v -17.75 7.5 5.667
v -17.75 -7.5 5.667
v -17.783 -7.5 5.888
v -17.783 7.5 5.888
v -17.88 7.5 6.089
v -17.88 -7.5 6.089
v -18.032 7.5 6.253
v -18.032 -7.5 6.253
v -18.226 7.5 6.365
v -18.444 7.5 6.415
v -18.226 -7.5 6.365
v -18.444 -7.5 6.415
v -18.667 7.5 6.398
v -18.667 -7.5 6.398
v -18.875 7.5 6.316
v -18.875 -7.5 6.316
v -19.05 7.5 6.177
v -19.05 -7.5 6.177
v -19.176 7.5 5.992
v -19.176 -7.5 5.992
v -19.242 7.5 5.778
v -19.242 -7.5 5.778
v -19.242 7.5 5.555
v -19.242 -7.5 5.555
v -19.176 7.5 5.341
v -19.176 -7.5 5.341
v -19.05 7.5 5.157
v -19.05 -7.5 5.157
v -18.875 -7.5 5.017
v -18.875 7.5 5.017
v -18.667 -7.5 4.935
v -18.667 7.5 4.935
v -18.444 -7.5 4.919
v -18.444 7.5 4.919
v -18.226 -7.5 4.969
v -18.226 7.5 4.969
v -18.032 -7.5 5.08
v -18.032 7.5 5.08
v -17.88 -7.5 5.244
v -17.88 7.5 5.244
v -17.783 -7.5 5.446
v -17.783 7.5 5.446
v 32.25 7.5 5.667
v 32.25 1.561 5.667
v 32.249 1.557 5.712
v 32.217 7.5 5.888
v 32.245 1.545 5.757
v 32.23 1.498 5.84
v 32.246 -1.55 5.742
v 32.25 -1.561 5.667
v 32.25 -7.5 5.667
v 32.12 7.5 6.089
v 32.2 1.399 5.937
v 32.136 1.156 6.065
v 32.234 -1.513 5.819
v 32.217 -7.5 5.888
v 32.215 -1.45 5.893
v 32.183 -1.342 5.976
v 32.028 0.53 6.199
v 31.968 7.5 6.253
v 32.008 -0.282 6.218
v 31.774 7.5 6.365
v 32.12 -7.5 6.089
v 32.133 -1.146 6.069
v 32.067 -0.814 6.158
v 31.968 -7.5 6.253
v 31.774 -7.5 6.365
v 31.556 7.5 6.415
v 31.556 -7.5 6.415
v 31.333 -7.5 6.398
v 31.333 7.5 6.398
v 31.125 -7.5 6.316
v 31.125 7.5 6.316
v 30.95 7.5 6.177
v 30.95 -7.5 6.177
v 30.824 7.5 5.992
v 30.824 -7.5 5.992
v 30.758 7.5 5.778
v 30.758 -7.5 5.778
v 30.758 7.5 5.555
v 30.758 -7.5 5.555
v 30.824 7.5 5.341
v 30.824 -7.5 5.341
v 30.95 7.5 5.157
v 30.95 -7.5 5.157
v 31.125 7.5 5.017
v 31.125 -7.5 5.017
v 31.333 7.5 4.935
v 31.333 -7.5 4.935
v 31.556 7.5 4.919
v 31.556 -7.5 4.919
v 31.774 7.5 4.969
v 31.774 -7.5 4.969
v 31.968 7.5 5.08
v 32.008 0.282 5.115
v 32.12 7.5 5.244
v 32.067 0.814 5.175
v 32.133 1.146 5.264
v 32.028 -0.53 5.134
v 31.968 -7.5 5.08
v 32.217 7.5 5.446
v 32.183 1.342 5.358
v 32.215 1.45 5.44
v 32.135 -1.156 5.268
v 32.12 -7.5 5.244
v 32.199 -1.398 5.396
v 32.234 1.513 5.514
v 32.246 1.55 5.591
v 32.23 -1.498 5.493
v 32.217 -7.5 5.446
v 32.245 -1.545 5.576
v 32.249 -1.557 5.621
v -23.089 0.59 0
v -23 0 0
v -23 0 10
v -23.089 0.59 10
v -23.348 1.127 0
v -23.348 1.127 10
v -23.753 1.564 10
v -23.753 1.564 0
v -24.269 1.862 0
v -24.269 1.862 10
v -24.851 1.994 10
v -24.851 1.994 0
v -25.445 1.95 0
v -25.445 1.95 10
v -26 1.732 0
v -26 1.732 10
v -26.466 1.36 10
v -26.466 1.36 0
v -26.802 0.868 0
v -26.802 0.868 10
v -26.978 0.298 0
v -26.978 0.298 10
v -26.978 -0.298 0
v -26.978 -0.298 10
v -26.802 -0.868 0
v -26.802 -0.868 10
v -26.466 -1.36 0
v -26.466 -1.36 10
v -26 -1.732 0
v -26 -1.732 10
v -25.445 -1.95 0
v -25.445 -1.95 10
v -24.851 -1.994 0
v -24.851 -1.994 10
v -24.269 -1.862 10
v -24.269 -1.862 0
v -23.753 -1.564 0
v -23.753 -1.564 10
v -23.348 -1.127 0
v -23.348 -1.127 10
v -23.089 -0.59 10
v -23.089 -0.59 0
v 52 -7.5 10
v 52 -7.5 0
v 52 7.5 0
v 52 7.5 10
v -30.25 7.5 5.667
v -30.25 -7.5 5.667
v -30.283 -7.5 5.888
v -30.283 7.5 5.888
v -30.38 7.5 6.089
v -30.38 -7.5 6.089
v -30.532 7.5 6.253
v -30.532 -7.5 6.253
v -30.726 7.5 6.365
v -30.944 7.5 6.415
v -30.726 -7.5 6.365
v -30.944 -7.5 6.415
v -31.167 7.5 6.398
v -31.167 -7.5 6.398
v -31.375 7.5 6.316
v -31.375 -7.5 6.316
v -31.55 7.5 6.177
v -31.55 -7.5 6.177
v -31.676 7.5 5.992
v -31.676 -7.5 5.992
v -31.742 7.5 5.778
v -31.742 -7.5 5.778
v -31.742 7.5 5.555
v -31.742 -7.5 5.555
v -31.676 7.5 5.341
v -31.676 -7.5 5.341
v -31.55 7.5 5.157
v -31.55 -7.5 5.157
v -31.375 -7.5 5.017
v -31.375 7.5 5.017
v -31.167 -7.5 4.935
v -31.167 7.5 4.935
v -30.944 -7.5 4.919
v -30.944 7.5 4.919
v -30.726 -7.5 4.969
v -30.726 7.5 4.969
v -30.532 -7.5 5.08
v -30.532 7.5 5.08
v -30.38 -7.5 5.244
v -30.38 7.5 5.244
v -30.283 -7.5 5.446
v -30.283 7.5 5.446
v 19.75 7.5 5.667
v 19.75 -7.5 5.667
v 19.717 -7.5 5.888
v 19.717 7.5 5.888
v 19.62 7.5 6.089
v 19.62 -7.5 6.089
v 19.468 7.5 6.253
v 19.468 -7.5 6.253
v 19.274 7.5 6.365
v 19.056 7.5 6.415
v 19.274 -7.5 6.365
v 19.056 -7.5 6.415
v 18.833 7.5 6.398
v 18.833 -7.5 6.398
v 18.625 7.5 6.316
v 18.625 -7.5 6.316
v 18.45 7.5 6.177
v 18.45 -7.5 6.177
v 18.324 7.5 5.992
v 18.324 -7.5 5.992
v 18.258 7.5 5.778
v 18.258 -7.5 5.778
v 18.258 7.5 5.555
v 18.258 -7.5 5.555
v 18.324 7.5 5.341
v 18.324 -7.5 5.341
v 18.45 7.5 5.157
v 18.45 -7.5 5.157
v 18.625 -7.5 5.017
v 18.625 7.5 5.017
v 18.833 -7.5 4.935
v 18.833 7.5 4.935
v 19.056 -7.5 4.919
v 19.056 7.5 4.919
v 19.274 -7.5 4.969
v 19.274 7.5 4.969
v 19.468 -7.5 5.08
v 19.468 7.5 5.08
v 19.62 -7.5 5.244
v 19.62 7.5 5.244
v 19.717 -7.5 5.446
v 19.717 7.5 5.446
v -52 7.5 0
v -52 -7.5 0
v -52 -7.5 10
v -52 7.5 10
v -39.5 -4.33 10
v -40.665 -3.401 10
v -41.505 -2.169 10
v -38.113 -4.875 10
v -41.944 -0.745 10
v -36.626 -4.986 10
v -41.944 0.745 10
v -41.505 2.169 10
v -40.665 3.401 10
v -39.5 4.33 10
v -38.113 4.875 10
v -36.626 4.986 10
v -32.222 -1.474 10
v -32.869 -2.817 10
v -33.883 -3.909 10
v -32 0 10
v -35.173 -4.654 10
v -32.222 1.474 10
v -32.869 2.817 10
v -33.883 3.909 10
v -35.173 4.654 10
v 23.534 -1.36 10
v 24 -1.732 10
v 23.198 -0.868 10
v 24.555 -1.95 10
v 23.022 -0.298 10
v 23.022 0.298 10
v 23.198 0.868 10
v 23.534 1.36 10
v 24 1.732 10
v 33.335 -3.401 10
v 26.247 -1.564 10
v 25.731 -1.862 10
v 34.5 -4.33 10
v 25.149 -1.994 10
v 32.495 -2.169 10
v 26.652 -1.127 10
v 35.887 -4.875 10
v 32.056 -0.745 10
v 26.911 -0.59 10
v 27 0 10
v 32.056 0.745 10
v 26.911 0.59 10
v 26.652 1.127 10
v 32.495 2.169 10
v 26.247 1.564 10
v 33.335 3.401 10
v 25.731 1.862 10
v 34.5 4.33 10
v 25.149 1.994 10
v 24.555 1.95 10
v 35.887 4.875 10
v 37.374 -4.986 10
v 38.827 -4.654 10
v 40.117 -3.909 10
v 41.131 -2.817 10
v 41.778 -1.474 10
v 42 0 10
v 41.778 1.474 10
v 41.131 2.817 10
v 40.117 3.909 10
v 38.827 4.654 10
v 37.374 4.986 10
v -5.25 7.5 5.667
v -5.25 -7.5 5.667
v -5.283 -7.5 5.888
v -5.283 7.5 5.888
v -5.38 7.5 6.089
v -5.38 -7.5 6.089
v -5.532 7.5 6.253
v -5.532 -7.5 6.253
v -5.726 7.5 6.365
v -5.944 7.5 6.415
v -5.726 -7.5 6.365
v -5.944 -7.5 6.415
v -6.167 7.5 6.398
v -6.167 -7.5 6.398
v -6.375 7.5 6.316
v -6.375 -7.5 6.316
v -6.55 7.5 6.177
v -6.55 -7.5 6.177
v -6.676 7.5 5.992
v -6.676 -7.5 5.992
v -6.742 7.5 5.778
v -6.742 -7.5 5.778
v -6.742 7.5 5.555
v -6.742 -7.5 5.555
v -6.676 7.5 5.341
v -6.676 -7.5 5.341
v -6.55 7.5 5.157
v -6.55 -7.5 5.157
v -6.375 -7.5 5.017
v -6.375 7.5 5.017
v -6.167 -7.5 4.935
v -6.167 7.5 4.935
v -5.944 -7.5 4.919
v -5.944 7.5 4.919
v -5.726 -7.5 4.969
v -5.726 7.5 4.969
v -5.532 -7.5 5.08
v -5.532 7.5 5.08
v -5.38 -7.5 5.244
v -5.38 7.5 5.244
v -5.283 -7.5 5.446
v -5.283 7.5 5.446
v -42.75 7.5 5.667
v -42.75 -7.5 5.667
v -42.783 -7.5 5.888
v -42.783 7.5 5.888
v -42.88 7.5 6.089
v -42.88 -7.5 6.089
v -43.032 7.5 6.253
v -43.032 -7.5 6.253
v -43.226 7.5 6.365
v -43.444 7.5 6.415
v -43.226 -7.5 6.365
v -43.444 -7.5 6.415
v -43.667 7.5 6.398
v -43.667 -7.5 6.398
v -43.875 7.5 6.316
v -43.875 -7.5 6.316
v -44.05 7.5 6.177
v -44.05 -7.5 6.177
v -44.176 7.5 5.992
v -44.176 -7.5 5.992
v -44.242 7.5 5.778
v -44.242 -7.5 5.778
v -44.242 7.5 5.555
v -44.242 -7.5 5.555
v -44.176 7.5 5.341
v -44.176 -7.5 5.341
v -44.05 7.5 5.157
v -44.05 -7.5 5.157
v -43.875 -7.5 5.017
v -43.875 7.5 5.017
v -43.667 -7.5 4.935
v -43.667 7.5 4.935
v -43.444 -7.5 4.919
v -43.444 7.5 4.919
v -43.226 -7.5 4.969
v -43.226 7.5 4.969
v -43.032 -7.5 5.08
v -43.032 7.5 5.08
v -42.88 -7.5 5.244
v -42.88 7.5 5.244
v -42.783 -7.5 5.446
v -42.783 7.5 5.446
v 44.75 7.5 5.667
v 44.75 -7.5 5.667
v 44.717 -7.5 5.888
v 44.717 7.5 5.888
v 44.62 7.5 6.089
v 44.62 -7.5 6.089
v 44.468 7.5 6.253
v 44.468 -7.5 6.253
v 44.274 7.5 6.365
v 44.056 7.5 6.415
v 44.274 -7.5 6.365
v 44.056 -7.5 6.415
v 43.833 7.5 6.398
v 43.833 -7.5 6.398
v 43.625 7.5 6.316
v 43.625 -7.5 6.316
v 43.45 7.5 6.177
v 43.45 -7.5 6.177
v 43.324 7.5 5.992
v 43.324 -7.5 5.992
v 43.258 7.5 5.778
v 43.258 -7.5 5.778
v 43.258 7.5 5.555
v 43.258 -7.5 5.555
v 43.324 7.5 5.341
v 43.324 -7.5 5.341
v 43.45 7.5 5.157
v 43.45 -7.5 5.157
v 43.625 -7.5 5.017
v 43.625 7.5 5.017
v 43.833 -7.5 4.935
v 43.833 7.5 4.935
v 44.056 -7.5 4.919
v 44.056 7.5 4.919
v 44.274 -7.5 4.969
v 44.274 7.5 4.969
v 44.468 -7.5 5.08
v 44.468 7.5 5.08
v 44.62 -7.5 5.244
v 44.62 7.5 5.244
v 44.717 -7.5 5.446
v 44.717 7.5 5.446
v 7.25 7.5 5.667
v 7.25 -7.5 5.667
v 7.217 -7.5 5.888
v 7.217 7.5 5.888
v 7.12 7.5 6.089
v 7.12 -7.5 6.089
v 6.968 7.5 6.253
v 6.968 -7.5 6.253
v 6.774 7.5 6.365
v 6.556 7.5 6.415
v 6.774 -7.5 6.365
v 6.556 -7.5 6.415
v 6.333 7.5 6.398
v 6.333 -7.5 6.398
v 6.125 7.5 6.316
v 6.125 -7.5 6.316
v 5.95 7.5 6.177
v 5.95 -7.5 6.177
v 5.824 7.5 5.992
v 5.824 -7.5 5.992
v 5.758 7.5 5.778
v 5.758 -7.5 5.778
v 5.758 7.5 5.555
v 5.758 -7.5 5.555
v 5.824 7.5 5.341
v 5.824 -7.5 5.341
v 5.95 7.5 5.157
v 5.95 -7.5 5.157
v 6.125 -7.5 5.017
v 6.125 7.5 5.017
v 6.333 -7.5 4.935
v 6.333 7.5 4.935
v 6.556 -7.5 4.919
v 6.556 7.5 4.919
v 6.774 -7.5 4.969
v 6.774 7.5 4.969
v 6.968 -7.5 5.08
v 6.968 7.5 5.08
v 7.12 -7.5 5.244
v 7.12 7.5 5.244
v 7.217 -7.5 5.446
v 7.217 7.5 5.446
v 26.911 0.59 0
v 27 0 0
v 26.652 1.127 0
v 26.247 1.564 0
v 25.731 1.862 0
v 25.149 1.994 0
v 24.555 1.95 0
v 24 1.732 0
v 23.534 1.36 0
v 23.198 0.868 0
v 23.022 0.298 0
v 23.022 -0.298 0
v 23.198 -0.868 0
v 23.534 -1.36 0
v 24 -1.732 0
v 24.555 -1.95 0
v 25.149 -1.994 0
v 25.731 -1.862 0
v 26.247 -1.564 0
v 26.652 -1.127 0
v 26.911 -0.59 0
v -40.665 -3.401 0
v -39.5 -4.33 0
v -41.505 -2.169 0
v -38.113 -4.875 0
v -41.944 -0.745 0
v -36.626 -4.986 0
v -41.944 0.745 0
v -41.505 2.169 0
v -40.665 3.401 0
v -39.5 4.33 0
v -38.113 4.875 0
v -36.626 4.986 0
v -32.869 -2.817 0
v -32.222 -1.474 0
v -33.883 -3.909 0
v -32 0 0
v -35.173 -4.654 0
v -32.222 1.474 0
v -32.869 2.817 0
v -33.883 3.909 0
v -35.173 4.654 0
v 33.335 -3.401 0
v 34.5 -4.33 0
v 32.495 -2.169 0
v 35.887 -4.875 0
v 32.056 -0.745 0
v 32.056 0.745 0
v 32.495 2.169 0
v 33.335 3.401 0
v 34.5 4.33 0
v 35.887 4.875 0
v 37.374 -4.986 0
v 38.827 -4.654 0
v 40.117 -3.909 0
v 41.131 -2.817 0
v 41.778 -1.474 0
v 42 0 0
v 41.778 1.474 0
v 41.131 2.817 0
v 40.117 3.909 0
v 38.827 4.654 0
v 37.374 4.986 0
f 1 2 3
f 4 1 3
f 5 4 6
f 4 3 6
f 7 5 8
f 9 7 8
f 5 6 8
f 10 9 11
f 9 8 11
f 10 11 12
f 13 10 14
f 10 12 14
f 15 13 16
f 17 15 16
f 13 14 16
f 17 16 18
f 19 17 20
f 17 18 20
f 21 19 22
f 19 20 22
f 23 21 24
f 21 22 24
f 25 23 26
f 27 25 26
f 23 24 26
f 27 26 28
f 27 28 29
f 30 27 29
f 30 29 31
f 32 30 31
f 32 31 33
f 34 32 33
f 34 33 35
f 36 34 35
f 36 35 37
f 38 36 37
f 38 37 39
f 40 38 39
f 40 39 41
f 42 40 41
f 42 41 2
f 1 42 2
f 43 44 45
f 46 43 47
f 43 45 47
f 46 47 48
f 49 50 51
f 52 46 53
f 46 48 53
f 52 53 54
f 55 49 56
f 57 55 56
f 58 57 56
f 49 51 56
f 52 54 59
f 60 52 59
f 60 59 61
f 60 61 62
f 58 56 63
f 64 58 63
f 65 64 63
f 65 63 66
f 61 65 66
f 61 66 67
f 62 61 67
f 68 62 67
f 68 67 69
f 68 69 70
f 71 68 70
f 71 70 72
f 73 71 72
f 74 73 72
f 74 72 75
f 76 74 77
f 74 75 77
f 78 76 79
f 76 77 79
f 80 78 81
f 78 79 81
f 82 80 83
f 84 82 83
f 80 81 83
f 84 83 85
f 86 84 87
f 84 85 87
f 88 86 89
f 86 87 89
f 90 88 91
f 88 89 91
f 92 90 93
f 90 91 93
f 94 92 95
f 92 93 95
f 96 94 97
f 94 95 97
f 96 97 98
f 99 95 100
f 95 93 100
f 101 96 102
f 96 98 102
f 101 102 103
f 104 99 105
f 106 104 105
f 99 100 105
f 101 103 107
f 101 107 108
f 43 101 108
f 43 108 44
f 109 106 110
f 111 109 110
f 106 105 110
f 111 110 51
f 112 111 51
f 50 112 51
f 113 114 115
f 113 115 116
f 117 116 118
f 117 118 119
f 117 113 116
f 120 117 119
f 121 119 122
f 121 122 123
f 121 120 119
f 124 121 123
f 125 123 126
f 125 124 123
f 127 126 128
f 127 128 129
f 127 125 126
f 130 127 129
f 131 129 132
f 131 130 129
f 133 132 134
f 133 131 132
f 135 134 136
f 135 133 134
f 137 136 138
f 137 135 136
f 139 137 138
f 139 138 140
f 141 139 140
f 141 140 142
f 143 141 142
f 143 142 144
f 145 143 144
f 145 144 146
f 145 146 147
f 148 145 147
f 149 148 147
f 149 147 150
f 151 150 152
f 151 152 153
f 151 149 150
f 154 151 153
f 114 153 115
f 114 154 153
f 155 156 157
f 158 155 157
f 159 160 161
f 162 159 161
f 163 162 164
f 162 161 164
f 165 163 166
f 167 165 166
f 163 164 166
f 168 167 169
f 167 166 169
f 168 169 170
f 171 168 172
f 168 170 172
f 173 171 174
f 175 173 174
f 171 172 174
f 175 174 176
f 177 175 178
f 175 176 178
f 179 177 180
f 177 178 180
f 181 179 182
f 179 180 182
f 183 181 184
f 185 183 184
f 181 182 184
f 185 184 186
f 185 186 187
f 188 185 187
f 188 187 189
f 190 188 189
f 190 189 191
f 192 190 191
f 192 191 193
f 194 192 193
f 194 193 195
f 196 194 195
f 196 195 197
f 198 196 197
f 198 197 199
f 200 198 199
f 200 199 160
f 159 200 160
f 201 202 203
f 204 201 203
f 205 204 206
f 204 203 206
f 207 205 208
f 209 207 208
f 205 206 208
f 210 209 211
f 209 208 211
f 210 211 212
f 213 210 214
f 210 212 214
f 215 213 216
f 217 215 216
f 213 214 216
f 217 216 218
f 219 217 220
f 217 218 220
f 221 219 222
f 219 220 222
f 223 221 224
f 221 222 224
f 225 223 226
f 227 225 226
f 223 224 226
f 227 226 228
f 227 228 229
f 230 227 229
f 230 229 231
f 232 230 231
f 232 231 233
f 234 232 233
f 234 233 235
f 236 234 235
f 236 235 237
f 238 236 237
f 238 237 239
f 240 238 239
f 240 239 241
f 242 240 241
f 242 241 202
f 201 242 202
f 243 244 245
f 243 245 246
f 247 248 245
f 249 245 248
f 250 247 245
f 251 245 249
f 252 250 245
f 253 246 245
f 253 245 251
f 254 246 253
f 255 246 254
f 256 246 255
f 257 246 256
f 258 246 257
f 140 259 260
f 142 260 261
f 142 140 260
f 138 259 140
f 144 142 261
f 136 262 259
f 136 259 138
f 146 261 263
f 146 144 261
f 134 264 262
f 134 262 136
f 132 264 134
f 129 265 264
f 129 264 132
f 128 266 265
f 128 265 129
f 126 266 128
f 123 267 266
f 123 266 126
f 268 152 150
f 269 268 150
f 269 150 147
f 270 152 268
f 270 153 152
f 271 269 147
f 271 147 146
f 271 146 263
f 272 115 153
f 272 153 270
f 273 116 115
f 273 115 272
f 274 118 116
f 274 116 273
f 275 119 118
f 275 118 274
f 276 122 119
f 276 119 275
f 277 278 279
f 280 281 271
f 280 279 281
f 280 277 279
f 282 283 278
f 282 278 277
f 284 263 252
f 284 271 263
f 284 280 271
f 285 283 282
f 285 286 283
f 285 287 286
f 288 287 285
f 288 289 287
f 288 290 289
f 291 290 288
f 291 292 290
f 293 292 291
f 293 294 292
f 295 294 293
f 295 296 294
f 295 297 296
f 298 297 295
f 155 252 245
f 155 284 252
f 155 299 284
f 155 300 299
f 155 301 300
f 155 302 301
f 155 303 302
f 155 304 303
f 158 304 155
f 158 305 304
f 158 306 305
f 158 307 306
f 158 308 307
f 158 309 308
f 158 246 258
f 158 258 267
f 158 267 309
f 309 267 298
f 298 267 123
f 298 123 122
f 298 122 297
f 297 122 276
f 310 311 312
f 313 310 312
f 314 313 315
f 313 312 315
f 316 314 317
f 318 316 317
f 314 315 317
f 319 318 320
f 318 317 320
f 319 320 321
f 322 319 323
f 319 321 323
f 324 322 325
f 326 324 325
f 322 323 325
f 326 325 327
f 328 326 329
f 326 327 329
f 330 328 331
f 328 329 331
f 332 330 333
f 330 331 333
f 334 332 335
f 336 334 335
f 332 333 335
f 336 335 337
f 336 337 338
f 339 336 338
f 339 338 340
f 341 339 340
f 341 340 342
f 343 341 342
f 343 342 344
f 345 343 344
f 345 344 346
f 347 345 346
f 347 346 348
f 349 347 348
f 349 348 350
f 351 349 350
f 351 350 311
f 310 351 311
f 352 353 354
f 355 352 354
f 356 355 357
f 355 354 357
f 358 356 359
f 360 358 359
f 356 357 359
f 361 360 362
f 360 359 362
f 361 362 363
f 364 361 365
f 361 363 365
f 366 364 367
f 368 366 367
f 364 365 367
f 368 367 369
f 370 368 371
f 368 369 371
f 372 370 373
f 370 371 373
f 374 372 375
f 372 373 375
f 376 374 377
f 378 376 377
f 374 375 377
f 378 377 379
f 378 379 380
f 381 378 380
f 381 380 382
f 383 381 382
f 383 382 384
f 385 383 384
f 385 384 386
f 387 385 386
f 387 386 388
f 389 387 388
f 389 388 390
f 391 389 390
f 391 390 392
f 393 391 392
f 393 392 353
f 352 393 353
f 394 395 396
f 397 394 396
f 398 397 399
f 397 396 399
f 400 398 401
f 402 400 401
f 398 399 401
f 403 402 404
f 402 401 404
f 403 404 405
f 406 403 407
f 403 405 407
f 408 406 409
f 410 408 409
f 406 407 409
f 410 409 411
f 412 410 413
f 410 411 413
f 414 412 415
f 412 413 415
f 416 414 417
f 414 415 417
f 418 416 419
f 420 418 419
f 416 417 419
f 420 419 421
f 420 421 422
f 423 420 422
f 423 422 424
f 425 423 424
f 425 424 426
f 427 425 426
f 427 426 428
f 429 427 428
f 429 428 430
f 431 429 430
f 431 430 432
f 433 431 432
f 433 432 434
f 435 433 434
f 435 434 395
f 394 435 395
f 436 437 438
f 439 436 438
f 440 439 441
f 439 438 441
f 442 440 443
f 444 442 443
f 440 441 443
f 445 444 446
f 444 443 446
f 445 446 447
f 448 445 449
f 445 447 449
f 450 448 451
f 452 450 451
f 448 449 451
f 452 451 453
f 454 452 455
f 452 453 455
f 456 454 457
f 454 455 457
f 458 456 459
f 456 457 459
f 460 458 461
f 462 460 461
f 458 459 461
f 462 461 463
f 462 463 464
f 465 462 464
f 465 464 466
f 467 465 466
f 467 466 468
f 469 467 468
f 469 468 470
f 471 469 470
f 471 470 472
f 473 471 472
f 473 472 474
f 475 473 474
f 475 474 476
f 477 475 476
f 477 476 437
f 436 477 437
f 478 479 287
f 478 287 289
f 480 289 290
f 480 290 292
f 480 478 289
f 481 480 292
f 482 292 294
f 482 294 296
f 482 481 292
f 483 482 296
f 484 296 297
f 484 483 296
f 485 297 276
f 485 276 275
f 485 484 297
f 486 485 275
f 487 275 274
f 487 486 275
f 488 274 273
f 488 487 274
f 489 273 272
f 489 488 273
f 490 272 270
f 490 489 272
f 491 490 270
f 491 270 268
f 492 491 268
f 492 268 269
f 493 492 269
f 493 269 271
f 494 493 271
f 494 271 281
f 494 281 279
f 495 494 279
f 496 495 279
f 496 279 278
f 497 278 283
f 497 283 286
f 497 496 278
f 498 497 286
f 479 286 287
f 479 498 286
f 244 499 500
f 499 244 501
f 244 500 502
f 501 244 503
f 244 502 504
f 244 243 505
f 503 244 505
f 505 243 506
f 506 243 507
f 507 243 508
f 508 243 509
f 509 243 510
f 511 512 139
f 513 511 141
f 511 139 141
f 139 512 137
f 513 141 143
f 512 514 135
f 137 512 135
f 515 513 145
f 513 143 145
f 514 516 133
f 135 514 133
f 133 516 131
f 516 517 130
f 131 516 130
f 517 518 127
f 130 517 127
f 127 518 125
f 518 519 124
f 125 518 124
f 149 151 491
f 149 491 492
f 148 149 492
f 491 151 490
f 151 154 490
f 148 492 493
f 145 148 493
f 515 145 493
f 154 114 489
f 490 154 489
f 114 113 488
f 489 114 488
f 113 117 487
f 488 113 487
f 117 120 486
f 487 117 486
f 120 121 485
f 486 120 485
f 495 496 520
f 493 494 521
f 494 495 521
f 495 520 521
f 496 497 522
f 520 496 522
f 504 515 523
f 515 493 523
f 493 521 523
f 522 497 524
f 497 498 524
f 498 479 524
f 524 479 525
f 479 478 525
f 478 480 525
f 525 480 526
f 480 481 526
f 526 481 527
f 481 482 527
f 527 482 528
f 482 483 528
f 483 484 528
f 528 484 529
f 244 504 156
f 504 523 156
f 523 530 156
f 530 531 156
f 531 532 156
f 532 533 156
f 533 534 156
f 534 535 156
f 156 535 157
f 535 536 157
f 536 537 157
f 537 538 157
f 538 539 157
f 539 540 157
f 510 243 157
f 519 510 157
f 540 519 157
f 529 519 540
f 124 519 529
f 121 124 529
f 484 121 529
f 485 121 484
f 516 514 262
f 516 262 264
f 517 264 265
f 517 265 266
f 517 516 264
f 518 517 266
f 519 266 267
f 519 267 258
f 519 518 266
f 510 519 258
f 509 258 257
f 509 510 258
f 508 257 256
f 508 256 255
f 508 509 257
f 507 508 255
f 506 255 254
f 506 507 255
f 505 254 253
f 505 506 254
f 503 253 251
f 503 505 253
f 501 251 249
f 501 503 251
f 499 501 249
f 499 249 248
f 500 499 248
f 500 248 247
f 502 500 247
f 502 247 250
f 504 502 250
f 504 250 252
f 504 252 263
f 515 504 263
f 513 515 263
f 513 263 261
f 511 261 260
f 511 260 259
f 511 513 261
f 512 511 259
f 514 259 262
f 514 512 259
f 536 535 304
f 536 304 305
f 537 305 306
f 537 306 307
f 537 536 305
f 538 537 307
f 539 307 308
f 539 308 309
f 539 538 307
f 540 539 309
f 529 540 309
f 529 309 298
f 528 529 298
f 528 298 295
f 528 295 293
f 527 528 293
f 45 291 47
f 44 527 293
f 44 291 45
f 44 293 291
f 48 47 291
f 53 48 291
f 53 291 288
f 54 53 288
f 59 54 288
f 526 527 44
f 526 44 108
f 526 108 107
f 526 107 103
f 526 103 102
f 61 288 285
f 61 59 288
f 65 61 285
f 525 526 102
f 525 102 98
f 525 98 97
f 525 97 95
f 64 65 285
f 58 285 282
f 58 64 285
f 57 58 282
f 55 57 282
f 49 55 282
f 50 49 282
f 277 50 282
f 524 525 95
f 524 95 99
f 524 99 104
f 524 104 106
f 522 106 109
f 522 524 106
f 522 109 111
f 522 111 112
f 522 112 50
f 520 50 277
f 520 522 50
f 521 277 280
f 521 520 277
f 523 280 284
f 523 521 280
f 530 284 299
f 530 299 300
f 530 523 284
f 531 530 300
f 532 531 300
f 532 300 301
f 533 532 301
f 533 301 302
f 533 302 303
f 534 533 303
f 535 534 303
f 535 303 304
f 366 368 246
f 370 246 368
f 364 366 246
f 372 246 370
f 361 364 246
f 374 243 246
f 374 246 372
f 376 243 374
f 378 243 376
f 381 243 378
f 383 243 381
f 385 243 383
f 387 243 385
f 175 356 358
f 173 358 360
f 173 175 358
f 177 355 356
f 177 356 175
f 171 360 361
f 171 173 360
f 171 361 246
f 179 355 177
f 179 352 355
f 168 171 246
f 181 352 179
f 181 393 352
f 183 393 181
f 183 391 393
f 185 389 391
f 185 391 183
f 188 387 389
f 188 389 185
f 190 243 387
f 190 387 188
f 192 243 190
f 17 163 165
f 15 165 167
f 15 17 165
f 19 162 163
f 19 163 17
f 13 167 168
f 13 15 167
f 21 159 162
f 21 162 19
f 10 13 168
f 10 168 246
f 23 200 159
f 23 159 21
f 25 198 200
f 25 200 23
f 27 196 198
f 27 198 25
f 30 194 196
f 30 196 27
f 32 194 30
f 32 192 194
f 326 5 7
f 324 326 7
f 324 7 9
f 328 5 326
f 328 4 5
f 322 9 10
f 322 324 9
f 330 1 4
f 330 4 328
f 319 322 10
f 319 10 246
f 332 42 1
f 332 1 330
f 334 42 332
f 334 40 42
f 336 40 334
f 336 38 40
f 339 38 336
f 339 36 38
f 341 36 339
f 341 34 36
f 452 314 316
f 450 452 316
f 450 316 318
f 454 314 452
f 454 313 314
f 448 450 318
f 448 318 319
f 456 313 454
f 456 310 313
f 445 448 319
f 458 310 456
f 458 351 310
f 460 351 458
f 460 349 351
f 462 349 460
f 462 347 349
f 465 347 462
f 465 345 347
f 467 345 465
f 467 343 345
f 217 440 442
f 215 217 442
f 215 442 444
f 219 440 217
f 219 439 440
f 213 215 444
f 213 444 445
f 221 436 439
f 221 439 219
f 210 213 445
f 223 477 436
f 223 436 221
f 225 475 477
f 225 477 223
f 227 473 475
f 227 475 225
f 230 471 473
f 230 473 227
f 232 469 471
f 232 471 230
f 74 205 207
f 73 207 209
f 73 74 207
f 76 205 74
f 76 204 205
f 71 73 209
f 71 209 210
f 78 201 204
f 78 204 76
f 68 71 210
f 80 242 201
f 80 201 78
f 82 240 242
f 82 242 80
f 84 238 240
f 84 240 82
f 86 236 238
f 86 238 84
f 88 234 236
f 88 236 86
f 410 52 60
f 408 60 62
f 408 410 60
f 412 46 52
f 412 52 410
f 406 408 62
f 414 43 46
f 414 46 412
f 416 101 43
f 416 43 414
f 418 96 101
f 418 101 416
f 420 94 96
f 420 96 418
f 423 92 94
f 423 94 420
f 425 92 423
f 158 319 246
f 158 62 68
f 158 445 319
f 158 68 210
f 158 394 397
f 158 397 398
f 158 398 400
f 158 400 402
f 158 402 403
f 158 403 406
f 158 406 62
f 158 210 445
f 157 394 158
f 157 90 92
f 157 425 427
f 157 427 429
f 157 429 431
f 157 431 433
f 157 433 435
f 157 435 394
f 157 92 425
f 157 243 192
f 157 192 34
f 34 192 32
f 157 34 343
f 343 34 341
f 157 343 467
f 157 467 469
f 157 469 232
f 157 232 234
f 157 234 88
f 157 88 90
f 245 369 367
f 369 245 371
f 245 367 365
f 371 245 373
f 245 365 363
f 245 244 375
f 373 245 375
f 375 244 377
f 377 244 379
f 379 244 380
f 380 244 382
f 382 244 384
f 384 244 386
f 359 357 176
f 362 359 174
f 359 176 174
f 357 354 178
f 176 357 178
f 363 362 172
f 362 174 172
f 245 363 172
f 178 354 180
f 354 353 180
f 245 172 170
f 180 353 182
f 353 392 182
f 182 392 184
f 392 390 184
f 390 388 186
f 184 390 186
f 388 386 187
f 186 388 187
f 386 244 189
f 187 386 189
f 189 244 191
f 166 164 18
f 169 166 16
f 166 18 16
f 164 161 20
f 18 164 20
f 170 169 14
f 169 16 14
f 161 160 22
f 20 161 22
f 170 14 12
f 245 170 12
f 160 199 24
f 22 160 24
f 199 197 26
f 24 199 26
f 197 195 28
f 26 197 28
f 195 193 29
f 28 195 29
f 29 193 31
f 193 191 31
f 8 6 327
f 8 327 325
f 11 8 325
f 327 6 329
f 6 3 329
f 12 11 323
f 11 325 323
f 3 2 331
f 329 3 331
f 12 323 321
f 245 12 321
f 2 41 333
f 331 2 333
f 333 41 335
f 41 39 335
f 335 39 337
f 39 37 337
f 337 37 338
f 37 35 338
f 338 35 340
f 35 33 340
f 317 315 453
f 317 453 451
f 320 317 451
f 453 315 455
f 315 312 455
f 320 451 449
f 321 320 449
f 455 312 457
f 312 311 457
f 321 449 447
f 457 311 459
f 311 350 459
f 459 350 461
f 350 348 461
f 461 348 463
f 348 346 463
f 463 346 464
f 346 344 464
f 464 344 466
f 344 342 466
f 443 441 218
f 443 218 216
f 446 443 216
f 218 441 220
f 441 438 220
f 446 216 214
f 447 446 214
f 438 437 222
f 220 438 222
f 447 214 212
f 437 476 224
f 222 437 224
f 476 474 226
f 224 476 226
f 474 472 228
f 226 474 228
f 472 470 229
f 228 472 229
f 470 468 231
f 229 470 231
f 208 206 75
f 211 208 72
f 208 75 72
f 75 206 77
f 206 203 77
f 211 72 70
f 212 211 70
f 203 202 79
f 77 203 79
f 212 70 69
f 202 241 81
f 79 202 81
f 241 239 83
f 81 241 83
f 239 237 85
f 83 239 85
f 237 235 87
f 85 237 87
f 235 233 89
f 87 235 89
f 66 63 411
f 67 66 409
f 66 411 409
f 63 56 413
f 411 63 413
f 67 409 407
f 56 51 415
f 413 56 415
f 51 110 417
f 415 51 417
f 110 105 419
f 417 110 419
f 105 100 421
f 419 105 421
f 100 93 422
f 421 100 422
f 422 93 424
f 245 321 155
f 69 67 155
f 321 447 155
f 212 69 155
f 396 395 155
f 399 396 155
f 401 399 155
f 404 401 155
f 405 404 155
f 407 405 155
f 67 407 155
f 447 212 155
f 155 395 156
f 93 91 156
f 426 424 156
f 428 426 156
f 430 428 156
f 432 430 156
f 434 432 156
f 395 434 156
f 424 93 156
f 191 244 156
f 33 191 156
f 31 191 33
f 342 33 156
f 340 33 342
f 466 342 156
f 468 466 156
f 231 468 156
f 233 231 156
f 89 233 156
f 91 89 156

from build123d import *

# Parameters (mm, degrees)
F0_W     = 104
F0_H     = 15
F0_R     = 5
F0_R_2   = 2
F1_DEPTH = 10
F2_R     = 0.75
F3_DEPTH = 25


with BuildPart() as f1:
    # F0 (on Top) → F1 (new body)
    with BuildSketch(Plane.XY):
        Rectangle(F0_W, F0_H)
        with Locations((-37, 0)):
            Circle(F0_R, mode=Mode.SUBTRACT)
        with Locations((-25, 0)):
            Circle(F0_R_2, mode=Mode.SUBTRACT)
        with Locations((25, 0)):
            Circle(F0_R_2, mode=Mode.SUBTRACT)
        with Locations((37, 0)):
            Circle(F0_R, mode=Mode.SUBTRACT)
    extrude(amount=F1_DEPTH)

    # F2 (on face) → F3 (cut)
    with BuildSketch(Plane.XZ.offset(7.5)):
        with Locations((-43.5, 5.666667)):
            Circle(F2_R)
        with Locations((-31, 5.666667)):
            Circle(F2_R)
        with Locations((-18.5, 5.666667)):
            Circle(F2_R)
        with Locations((-6, 5.666667)):
            Circle(F2_R)
        with Locations((6.5, 5.666667)):
            Circle(F2_R)
        with Locations((19, 5.666667)):
            Circle(F2_R)
        with Locations((31.5, 5.666667)):
            Circle(F2_R)
        with Locations((44, 5.666667)):
            Circle(F2_R)
    extrude(amount=-F3_DEPTH, mode=Mode.SUBTRACT)


solid = f1.part
